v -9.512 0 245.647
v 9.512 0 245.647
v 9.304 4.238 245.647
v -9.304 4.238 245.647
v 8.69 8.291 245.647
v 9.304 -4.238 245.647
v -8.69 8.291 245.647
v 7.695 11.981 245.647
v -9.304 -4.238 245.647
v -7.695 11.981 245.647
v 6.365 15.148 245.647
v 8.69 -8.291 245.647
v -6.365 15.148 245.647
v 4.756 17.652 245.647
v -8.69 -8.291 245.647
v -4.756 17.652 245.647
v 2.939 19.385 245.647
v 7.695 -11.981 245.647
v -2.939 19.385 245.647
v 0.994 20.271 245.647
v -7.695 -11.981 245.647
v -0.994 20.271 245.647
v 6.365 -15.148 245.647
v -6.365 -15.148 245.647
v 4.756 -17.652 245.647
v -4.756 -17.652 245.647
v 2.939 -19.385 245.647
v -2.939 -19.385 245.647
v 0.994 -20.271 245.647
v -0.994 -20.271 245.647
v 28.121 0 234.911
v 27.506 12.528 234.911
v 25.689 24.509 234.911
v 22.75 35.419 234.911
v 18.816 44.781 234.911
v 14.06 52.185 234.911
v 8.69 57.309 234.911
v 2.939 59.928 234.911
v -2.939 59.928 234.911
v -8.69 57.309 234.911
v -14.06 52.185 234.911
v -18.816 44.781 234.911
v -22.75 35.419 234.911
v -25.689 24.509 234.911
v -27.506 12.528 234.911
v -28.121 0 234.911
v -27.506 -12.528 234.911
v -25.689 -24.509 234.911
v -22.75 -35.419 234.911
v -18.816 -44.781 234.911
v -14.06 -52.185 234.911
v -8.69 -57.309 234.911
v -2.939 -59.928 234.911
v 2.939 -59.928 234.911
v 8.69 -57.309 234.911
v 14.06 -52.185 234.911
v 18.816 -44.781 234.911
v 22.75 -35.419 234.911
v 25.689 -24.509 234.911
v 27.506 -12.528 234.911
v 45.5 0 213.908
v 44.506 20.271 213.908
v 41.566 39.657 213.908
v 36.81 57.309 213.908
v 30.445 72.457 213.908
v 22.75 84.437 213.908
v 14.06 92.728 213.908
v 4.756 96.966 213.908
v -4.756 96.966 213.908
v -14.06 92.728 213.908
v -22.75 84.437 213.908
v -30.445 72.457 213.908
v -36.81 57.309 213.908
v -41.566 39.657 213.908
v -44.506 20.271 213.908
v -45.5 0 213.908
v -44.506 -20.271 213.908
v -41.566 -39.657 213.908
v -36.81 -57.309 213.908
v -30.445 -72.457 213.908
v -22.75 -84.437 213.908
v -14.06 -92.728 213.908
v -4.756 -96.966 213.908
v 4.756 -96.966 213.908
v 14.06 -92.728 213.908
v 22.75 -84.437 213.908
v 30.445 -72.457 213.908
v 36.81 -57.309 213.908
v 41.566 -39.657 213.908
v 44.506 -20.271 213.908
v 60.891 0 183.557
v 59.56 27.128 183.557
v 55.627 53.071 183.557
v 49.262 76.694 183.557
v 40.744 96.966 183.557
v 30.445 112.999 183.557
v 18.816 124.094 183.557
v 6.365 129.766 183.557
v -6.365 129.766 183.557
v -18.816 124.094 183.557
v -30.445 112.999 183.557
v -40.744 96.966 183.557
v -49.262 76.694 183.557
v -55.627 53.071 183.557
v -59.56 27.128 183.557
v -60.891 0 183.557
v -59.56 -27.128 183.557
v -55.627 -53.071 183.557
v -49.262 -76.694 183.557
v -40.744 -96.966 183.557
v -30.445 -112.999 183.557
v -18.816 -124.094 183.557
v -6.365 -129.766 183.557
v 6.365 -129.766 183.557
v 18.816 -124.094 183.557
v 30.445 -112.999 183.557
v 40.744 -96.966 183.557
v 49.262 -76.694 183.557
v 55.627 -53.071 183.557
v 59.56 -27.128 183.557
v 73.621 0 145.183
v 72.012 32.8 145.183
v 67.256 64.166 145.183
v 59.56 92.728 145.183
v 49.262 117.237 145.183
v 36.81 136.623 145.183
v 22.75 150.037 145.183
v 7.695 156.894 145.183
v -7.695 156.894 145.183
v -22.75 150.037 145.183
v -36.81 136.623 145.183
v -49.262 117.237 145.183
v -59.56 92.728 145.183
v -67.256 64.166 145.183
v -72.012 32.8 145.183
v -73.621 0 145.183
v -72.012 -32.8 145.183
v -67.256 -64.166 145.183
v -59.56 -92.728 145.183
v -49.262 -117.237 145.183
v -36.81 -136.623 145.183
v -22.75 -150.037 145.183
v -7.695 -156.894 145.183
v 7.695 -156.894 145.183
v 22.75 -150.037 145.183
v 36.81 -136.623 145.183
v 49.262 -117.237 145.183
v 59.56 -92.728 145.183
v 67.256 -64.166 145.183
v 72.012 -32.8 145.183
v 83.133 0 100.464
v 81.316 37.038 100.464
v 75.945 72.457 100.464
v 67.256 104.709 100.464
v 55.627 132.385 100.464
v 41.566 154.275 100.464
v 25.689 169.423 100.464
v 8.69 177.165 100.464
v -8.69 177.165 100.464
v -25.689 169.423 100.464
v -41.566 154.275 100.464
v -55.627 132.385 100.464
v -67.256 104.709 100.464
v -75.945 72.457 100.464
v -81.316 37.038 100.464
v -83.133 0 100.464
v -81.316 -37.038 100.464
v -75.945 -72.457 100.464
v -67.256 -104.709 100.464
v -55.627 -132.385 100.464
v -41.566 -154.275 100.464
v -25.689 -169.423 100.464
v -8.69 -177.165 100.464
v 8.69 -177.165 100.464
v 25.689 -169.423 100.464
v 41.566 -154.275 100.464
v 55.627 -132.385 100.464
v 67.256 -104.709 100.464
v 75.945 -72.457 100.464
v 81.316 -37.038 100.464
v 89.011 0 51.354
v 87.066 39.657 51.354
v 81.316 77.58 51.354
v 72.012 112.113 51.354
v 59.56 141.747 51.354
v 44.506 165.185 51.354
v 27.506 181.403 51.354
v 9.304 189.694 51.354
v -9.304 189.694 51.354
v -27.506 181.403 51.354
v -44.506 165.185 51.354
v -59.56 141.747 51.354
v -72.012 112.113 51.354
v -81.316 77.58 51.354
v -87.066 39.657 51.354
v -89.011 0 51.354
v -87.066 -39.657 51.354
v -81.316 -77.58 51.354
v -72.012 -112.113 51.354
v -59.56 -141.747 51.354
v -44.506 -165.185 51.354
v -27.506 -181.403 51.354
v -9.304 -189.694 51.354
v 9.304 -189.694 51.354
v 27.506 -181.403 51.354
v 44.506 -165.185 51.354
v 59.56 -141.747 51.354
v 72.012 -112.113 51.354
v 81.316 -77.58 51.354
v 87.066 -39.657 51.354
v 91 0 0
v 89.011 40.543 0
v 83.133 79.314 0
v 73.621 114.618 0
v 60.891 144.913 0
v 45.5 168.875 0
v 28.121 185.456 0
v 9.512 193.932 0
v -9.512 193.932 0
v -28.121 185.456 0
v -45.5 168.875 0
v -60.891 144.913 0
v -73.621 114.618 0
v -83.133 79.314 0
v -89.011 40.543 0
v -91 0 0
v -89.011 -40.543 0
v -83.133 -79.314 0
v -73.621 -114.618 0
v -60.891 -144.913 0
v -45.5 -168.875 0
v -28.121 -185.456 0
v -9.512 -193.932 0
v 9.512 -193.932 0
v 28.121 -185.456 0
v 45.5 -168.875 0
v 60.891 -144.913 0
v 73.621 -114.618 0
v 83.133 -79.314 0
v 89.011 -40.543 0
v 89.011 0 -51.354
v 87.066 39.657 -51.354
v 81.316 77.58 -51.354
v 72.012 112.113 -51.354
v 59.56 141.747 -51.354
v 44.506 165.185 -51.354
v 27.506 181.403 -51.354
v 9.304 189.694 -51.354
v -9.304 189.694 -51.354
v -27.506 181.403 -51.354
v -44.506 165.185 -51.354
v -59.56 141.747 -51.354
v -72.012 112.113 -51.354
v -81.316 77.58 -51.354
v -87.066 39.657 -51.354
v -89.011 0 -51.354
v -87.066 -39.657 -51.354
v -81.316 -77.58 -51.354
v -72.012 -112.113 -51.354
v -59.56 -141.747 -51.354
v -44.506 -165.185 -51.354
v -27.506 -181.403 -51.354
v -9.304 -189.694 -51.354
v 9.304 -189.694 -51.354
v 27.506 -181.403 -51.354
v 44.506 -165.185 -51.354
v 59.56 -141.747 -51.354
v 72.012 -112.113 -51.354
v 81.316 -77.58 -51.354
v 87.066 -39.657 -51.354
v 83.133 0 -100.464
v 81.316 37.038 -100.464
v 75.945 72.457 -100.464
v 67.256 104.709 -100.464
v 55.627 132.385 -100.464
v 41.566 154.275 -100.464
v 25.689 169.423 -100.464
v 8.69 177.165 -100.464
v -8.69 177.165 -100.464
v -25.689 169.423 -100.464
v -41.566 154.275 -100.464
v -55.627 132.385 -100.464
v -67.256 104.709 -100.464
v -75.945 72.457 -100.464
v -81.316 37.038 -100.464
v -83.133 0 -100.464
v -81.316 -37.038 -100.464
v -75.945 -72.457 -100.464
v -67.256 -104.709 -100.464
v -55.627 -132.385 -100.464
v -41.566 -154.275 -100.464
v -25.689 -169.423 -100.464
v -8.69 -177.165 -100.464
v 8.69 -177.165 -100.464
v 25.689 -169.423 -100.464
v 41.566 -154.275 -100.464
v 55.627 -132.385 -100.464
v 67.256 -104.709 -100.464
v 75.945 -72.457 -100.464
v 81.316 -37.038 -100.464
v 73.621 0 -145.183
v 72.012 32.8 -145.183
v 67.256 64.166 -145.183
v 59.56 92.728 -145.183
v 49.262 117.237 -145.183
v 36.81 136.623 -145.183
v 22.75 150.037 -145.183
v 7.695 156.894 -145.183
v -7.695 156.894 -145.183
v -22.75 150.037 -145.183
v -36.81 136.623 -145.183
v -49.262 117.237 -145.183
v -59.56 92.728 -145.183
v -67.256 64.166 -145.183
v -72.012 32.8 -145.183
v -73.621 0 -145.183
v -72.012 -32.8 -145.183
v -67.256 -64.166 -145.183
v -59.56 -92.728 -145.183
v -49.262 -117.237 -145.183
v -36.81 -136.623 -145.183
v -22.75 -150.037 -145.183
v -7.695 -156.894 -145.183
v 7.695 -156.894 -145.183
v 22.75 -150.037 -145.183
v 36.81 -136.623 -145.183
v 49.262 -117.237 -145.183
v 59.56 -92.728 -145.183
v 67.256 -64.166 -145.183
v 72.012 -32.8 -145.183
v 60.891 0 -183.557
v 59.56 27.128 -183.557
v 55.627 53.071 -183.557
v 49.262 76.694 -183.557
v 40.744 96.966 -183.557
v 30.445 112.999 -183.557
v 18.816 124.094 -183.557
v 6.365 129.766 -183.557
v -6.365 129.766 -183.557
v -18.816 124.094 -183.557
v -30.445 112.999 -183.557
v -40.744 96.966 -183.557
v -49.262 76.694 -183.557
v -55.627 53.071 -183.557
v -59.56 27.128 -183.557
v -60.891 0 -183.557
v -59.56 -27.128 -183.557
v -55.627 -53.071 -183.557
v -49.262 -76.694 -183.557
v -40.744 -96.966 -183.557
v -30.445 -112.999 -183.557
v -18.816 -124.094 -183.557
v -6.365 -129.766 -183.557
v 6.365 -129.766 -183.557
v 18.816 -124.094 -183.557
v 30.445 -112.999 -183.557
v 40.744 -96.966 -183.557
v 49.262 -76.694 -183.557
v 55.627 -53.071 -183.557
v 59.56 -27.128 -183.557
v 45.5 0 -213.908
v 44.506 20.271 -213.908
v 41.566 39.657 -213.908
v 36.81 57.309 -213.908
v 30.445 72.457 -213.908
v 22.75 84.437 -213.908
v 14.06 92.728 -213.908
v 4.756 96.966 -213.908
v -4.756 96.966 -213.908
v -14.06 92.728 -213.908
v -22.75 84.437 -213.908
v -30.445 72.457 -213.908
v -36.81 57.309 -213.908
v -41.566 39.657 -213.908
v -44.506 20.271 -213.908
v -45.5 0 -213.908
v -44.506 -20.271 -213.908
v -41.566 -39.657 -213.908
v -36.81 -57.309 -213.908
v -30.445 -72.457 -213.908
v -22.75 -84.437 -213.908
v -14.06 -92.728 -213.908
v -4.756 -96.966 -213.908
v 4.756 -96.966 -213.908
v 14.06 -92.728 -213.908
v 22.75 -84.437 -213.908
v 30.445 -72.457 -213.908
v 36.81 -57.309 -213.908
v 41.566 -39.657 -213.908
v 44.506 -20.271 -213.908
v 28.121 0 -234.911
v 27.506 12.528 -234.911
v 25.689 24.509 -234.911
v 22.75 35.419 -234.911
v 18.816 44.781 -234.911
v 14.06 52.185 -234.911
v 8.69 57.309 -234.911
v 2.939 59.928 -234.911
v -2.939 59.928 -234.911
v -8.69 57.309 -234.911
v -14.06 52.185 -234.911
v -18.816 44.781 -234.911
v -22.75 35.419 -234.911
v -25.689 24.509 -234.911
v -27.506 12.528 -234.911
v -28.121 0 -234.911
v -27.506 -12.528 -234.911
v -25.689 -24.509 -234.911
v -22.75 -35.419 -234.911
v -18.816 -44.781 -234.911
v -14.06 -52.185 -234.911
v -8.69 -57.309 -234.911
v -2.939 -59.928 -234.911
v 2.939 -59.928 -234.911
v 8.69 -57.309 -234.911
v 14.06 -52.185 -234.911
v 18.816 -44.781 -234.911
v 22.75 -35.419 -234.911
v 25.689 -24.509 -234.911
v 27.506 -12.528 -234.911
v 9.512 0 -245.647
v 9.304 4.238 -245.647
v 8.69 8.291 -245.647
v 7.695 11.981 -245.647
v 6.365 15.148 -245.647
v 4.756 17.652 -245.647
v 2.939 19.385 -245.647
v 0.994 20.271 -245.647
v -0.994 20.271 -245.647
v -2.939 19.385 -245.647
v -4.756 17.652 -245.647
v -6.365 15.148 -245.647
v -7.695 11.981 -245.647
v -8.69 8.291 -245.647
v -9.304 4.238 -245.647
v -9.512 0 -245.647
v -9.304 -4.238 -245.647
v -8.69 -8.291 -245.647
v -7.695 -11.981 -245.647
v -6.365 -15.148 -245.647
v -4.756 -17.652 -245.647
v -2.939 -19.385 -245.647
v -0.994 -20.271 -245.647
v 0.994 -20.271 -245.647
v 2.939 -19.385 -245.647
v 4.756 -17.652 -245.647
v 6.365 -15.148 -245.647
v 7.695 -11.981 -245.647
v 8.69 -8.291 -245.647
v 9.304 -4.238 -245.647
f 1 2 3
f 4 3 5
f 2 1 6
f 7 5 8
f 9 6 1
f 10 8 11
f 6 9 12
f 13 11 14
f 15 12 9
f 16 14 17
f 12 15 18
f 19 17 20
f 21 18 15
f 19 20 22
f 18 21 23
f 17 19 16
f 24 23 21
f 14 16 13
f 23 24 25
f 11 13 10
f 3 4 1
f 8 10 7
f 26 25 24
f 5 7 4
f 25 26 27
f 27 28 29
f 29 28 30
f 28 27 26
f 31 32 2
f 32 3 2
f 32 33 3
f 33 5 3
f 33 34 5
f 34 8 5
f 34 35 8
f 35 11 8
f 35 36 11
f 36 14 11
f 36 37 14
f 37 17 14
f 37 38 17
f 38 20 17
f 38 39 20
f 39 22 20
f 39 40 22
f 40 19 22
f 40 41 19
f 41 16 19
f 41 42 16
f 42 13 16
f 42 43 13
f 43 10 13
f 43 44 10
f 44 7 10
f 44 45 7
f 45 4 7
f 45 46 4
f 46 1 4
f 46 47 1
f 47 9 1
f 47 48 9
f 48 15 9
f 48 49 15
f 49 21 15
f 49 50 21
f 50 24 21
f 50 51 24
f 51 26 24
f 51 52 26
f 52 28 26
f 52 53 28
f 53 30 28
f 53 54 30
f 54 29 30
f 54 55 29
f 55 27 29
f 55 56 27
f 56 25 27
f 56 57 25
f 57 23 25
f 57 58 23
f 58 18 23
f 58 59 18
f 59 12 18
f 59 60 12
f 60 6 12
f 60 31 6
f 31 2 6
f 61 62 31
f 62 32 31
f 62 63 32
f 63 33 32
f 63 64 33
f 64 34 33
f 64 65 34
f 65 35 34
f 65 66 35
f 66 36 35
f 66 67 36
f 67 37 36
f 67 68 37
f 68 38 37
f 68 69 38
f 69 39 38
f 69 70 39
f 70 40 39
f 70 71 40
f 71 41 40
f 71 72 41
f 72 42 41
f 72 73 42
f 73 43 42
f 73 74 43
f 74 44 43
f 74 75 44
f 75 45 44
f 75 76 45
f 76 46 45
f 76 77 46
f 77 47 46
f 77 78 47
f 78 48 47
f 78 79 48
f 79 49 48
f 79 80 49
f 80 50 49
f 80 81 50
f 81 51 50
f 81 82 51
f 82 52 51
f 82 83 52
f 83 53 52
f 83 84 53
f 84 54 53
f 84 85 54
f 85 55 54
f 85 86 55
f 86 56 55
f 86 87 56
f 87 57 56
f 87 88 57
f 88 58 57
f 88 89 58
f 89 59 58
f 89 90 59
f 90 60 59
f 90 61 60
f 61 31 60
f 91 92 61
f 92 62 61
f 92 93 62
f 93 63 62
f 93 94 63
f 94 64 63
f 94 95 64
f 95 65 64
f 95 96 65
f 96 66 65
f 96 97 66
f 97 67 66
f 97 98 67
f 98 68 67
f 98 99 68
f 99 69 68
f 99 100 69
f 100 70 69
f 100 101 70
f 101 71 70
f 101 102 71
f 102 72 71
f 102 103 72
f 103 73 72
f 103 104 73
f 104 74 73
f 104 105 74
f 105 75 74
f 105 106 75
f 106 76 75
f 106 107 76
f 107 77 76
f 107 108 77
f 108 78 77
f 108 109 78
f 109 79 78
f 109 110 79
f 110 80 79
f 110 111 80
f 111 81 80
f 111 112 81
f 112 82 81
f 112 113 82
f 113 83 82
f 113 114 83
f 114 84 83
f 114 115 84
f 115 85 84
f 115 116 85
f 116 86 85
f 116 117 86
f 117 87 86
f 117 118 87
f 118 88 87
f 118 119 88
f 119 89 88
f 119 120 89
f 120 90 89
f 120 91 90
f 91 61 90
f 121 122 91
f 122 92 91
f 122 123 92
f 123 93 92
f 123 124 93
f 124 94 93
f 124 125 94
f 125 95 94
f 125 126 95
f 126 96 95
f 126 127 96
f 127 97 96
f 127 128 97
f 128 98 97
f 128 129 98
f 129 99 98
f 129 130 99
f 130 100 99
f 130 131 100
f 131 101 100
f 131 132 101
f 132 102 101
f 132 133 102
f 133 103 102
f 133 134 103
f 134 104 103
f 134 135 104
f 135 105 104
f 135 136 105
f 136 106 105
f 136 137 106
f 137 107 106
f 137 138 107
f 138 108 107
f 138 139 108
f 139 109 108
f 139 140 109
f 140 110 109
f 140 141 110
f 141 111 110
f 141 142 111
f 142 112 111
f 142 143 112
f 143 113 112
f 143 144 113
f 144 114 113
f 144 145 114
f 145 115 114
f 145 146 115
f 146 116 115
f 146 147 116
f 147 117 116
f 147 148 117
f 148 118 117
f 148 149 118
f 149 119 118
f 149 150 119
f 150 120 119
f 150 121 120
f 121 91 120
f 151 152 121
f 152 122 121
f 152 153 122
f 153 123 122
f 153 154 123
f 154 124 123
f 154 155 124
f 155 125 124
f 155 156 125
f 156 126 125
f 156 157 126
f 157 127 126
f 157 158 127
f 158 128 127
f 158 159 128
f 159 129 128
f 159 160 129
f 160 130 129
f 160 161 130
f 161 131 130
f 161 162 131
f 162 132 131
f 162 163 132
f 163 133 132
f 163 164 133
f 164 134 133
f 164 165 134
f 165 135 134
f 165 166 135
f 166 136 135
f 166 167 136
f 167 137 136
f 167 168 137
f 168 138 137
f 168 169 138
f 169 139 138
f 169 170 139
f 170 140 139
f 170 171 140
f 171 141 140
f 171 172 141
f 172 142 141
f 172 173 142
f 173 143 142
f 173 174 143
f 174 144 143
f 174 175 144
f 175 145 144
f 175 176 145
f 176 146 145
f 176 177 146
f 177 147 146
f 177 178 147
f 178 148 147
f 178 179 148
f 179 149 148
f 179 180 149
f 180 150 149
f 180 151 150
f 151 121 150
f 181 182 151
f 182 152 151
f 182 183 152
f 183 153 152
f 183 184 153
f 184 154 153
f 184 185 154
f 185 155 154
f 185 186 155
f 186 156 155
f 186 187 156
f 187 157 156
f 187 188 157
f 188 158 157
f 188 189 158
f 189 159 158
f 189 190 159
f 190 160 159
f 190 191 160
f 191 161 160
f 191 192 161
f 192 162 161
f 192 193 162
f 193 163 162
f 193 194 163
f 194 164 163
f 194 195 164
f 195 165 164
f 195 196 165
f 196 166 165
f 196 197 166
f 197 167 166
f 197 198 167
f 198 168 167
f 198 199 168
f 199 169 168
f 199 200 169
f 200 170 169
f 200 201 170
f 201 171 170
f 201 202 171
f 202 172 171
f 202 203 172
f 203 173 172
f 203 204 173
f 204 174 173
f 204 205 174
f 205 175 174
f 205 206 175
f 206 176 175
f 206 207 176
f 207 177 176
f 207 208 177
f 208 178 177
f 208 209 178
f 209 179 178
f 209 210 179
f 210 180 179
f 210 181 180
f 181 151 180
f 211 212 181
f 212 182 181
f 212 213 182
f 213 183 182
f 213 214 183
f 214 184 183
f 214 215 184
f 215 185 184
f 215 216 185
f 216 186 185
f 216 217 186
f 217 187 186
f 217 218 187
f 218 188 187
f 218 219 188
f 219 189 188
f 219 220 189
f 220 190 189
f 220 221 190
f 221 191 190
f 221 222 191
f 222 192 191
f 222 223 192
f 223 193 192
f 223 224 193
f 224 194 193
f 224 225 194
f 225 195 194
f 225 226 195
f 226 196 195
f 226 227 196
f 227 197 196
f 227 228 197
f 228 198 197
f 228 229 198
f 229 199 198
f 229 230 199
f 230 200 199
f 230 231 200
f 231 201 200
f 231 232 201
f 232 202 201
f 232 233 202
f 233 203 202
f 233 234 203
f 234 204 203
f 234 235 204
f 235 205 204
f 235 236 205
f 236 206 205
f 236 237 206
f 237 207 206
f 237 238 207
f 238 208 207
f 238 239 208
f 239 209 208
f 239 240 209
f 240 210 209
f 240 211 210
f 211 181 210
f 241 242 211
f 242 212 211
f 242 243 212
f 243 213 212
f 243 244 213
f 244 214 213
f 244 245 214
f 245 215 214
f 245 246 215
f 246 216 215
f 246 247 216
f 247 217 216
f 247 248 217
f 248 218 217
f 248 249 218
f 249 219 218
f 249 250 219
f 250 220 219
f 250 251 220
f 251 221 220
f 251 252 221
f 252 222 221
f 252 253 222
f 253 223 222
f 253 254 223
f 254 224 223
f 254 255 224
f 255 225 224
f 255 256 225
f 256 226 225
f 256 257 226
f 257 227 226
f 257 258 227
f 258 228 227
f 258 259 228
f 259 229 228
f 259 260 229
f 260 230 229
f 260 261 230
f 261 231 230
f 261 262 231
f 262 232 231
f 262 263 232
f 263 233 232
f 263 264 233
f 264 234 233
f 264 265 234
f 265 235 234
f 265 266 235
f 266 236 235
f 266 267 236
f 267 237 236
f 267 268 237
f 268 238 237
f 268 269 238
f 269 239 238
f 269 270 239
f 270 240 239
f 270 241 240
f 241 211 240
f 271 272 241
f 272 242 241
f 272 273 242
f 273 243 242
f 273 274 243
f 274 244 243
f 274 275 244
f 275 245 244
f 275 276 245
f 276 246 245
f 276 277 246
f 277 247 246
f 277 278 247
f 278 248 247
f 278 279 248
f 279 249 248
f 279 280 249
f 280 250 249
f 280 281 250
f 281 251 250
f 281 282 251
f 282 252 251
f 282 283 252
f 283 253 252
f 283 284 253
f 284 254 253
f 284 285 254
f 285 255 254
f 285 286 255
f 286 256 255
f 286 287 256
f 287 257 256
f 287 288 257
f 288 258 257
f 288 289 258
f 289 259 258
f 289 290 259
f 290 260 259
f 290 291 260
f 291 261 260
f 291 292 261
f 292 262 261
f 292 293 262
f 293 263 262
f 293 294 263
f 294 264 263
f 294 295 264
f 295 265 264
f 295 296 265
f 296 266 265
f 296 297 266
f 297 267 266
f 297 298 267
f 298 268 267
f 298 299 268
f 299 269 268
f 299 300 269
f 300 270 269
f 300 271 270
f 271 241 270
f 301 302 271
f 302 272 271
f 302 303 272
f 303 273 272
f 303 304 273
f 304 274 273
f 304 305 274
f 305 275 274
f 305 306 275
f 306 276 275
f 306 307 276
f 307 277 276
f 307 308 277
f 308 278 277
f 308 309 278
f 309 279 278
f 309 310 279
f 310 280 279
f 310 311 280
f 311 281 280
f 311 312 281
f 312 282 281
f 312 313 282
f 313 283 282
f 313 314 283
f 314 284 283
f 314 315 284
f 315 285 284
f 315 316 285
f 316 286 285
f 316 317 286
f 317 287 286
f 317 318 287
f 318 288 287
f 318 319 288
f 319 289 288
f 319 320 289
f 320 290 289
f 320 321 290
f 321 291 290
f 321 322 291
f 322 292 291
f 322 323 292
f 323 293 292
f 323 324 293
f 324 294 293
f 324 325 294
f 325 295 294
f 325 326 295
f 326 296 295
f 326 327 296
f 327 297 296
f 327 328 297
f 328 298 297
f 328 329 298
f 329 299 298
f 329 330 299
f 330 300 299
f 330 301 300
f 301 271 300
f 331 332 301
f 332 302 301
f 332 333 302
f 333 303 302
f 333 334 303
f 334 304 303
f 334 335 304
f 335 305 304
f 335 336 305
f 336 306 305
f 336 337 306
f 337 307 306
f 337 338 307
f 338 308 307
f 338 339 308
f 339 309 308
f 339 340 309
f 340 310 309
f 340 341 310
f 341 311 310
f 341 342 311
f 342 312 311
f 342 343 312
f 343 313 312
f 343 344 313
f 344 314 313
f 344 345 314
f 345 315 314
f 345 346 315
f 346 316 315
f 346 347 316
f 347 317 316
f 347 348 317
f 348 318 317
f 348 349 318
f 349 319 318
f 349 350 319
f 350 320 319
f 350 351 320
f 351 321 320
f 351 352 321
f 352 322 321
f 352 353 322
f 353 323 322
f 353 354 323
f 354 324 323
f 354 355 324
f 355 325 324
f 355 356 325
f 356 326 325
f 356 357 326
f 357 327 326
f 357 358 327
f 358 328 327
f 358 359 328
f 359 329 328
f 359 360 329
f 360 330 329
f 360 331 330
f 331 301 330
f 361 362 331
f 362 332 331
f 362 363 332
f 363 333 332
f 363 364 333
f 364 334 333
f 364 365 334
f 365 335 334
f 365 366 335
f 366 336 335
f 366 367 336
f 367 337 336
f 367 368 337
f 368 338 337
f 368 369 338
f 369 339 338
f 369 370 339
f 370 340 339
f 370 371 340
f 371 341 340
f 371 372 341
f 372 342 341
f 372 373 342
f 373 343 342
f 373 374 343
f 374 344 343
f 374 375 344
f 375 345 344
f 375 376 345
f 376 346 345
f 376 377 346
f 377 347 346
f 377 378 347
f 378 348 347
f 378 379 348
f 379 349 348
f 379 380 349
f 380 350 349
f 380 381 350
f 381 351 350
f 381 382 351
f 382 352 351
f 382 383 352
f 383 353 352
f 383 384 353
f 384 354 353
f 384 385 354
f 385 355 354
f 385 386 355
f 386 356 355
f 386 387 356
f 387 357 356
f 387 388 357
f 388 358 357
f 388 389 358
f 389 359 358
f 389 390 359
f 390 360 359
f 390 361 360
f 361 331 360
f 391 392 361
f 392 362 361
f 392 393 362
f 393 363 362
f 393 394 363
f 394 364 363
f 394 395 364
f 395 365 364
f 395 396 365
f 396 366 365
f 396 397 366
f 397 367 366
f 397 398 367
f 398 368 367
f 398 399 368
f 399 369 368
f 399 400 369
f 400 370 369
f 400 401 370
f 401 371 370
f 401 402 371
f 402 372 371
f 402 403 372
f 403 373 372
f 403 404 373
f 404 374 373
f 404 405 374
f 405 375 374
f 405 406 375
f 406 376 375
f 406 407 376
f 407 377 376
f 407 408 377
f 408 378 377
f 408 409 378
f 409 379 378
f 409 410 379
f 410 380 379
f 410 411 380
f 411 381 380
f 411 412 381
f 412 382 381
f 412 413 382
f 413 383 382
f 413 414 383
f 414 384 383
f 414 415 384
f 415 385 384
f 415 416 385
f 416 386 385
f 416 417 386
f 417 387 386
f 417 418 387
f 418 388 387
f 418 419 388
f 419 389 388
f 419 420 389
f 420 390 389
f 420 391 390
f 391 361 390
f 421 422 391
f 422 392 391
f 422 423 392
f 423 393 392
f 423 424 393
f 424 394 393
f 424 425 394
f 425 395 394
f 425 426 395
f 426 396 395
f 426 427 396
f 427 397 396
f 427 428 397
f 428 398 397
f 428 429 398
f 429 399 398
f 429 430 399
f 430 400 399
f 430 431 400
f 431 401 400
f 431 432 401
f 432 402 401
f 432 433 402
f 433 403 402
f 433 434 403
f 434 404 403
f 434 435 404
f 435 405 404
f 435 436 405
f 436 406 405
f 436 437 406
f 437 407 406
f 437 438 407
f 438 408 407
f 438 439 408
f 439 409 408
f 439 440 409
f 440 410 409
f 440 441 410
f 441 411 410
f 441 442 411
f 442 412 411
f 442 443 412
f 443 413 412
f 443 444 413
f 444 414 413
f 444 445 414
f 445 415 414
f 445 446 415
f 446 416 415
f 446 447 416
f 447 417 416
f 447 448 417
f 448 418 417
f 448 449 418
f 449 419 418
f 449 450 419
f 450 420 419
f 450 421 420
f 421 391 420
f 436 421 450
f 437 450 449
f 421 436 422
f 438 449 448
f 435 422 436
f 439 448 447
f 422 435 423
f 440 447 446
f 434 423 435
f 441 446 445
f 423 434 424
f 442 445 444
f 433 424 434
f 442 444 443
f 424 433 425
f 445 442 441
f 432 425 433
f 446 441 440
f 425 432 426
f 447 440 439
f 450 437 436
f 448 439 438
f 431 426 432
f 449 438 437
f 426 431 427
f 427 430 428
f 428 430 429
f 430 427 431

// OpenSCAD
// Generated by SolidPython 1.0.1 on 2020-07-29 00:46:48


scale(v = [7, 15, 19]) {
	sphere(r = 13);
}
/***********************************************
*********      SolidPython code:      **********
************************************************
 
# import packages: SolidPython
from solid import *
from solid.utils import *
from itertools import chain, combinations, permutations


class Resize:

    def __init__(self, scad_file):
        self.scad_file = scad_file
        #self.scad_file = import_scad(scad_file)
        # cone/cylinder param:
        self.r1 = 0
        self.r2 = 0
        self.h = 0
        # rectangular prism param:
        self.w = 0
        self.l = 0
        # ellipse param:
        self.r = 0

    # import OpenScad code (file name corresponds to shape)


    # classify shape + parameters
    def assign(self, param1, param2, param3):
        if self.scad_file == 'cone.scad':
            self.r1 = param1
            self.r2 = param2
            self.h = param3
        elif self.scad_file == 'cylinder.scad':
            self.r1 = param1
            self.r2 = param2
            self.h = param3
        elif self.scad_file == 'rectangularPrism.scad':
            self.h = param1
            self.l = param2
            self.w = param3
        else:
            self.r = param1
            self.h = param2

    # resize parameters
    def iterate(self):
        x = range(3, 20, 2)
        i = 1
        if self.scad_file == 'cone.scad':
            tempList = list(permutations(x, 2))
            for temp in tempList:
                param1 = temp[0]
                param2 = temp[1]
                filepath = 'produced_scad_files/' + 'cone' + str(param1) + '_' + str(param2) + '_' + '.scad'
                scad_render_to_file(cylinder(h=param1, r1=param2, r2=0), filepath)

        elif self.scad_file == 'cylinder.scad':
            tempList = list(permutations(x, 3))
            for temp in tempList:
                param1 = temp[0]
                param2 = temp[1]
                filepath = 'produced_scad_files/' + 'cylinder' + str(param1) + '_' + str(param2) + '_' + '.scad'
                scad_render_to_file(cylinder(h=param1, r1=param2, r2=param2), filepath)

        elif self.scad_file == 'rectangularPrism.scad':
            tempList = list(permutations(x, 3))
            for temp in tempList:
                param1 = temp[0]
                param2 = temp[1]
                param3 = temp[2]
                filepath = 'produced_scad_files/' + 'rectangularPrism' + str(param1) + '_' + str(param2) + '_' + str(
                    param3) + '.scad'
                scad_render_to_file(cube(size=(param1, param2, param3)), filepath)

        elif self.scad_file == 'ellipse.scad':
            tempList = list(permutations(x, 4))
            for temp in tempList:
                param1 = temp[0]
                param2 = temp[1]
                param3 = temp[2]
                param4 = temp[3]
                filepath = 'produced_scad_files/' + 'ellipse' + str(param1) + '_' + str(param2) + '_' + str(param3) + '_' + str(param4) + '.scad'
                scad_render_to_file(scale([param1, param2, param3])(sphere(r=param4)), filepath)

    def render_to_scadfile(self):
        scad_render_to_file(scad, 'example.scad') 
 
************************************************/
